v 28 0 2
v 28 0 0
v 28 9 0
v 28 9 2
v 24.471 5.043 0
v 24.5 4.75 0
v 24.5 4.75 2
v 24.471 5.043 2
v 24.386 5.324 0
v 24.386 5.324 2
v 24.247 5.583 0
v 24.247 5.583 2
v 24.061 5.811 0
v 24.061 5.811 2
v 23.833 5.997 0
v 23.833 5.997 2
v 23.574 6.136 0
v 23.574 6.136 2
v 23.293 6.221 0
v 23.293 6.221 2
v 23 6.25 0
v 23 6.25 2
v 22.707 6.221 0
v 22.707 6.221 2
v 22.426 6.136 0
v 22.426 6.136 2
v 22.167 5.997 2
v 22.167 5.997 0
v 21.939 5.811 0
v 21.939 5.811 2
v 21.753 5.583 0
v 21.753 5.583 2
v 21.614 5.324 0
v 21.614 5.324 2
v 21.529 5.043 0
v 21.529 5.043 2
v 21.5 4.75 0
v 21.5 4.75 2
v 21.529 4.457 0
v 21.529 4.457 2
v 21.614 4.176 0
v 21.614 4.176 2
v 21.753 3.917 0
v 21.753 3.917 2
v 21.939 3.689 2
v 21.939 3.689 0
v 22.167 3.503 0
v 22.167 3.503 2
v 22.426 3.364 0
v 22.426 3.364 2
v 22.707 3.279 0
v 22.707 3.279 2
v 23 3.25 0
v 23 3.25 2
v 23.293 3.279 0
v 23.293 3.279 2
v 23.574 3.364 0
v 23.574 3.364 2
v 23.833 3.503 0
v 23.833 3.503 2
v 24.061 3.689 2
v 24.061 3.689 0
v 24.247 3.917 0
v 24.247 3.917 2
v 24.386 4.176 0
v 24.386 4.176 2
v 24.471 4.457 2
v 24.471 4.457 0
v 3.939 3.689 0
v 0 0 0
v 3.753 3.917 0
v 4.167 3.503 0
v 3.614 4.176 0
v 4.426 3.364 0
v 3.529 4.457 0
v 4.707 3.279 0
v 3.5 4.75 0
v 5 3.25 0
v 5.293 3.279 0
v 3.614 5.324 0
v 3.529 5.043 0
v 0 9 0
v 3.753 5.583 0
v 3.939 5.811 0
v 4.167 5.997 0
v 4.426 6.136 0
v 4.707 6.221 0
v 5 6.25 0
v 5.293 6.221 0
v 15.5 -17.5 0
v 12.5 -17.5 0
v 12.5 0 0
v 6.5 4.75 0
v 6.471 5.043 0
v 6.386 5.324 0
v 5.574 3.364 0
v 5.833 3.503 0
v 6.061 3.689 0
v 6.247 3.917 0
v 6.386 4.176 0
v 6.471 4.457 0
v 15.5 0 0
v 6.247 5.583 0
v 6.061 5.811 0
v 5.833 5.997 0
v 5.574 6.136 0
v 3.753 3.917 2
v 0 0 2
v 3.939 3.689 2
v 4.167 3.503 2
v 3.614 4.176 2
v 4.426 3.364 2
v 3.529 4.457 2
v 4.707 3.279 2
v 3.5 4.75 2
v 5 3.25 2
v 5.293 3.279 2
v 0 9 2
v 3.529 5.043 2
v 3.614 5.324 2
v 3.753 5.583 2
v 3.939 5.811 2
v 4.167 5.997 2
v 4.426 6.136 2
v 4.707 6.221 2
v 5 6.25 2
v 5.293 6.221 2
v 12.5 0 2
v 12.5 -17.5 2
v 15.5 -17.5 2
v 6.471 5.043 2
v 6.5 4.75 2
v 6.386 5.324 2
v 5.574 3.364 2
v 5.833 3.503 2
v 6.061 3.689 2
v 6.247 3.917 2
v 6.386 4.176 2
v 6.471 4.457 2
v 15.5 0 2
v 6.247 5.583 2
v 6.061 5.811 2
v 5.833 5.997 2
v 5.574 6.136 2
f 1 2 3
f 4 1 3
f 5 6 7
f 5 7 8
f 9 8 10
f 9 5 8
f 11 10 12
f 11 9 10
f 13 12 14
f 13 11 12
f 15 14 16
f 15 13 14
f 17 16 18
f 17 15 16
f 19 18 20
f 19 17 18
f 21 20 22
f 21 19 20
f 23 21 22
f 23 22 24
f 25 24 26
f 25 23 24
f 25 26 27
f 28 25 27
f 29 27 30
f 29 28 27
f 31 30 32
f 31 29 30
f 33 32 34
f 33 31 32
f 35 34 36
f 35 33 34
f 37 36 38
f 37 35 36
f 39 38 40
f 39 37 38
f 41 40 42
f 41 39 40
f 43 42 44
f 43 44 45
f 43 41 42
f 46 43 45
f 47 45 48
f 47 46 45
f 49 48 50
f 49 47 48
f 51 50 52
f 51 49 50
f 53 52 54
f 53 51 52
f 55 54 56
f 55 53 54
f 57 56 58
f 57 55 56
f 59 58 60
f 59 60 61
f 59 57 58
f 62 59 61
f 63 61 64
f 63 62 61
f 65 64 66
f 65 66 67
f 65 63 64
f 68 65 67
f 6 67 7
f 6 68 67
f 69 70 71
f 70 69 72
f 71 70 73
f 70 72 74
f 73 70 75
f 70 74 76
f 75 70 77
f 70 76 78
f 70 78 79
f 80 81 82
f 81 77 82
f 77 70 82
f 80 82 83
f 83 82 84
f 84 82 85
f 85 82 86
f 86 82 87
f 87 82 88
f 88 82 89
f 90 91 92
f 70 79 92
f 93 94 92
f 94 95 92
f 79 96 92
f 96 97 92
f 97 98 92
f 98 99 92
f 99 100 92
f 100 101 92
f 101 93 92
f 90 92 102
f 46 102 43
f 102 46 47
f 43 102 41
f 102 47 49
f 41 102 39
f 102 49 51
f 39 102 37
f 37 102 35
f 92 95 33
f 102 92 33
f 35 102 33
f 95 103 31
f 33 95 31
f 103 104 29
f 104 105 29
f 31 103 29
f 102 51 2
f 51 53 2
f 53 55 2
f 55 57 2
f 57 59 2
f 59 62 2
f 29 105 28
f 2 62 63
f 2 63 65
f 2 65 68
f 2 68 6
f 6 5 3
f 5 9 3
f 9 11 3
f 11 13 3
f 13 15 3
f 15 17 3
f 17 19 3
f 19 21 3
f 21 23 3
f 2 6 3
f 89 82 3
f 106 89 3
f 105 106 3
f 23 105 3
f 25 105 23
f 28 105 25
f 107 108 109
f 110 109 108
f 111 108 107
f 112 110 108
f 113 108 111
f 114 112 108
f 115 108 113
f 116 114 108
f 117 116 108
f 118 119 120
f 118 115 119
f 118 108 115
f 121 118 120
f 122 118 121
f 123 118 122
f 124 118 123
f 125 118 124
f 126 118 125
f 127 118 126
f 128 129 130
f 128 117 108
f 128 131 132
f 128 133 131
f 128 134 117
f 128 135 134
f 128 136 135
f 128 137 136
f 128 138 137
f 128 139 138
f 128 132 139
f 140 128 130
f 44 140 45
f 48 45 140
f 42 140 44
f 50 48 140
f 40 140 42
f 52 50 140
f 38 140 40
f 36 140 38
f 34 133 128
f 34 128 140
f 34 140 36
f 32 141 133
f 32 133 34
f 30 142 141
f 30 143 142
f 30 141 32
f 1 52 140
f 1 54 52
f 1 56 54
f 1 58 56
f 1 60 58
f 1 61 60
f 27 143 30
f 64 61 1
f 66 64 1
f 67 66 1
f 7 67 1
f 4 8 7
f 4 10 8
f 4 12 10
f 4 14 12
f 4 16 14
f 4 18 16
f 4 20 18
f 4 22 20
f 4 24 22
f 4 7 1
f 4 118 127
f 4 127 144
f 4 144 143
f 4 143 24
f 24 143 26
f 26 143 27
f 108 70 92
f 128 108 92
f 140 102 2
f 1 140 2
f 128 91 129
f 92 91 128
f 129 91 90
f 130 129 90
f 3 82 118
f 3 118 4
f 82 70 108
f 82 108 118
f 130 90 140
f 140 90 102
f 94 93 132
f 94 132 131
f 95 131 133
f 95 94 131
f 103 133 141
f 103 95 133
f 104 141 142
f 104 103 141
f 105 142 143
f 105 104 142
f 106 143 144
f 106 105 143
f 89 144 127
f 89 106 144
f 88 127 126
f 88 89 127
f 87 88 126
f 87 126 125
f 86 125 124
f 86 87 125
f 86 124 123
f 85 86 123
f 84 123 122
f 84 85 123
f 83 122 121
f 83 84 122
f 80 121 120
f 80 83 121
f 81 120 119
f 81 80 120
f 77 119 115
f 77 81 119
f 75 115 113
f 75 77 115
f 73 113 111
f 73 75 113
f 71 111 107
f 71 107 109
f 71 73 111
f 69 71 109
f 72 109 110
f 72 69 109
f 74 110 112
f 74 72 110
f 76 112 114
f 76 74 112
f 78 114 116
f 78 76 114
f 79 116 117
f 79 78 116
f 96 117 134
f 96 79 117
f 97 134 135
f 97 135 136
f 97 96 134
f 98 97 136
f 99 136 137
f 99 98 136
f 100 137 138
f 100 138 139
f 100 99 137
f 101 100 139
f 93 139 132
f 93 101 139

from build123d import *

# Parameters (mm, degrees)
SKETCH1_W           = 28
SKETCH1_H           = 9
SKETCH1_R           = 1.5
SKETCH1_W_2         = 3
SKETCH1_H_2         = 17.5
BOSS_EXTRUDE1_DEPTH = 2


with BuildPart() as part:
    # Sketch1 → Boss-Extrude1 (new body)
    with BuildSketch(Plane.XY):
        with Locations((14, 4.5)):
            Rectangle(SKETCH1_W, SKETCH1_H)
        with Locations((5, 4.75)):
            Circle(SKETCH1_R, mode=Mode.SUBTRACT)
        with Locations((23, 4.75)):
            Circle(SKETCH1_R, mode=Mode.SUBTRACT)
        with Locations((14, -8.75)):
            Rectangle(SKETCH1_W_2, SKETCH1_H_2)
    extrude(amount=BOSS_EXTRUDE1_DEPTH)


solid = part.part
